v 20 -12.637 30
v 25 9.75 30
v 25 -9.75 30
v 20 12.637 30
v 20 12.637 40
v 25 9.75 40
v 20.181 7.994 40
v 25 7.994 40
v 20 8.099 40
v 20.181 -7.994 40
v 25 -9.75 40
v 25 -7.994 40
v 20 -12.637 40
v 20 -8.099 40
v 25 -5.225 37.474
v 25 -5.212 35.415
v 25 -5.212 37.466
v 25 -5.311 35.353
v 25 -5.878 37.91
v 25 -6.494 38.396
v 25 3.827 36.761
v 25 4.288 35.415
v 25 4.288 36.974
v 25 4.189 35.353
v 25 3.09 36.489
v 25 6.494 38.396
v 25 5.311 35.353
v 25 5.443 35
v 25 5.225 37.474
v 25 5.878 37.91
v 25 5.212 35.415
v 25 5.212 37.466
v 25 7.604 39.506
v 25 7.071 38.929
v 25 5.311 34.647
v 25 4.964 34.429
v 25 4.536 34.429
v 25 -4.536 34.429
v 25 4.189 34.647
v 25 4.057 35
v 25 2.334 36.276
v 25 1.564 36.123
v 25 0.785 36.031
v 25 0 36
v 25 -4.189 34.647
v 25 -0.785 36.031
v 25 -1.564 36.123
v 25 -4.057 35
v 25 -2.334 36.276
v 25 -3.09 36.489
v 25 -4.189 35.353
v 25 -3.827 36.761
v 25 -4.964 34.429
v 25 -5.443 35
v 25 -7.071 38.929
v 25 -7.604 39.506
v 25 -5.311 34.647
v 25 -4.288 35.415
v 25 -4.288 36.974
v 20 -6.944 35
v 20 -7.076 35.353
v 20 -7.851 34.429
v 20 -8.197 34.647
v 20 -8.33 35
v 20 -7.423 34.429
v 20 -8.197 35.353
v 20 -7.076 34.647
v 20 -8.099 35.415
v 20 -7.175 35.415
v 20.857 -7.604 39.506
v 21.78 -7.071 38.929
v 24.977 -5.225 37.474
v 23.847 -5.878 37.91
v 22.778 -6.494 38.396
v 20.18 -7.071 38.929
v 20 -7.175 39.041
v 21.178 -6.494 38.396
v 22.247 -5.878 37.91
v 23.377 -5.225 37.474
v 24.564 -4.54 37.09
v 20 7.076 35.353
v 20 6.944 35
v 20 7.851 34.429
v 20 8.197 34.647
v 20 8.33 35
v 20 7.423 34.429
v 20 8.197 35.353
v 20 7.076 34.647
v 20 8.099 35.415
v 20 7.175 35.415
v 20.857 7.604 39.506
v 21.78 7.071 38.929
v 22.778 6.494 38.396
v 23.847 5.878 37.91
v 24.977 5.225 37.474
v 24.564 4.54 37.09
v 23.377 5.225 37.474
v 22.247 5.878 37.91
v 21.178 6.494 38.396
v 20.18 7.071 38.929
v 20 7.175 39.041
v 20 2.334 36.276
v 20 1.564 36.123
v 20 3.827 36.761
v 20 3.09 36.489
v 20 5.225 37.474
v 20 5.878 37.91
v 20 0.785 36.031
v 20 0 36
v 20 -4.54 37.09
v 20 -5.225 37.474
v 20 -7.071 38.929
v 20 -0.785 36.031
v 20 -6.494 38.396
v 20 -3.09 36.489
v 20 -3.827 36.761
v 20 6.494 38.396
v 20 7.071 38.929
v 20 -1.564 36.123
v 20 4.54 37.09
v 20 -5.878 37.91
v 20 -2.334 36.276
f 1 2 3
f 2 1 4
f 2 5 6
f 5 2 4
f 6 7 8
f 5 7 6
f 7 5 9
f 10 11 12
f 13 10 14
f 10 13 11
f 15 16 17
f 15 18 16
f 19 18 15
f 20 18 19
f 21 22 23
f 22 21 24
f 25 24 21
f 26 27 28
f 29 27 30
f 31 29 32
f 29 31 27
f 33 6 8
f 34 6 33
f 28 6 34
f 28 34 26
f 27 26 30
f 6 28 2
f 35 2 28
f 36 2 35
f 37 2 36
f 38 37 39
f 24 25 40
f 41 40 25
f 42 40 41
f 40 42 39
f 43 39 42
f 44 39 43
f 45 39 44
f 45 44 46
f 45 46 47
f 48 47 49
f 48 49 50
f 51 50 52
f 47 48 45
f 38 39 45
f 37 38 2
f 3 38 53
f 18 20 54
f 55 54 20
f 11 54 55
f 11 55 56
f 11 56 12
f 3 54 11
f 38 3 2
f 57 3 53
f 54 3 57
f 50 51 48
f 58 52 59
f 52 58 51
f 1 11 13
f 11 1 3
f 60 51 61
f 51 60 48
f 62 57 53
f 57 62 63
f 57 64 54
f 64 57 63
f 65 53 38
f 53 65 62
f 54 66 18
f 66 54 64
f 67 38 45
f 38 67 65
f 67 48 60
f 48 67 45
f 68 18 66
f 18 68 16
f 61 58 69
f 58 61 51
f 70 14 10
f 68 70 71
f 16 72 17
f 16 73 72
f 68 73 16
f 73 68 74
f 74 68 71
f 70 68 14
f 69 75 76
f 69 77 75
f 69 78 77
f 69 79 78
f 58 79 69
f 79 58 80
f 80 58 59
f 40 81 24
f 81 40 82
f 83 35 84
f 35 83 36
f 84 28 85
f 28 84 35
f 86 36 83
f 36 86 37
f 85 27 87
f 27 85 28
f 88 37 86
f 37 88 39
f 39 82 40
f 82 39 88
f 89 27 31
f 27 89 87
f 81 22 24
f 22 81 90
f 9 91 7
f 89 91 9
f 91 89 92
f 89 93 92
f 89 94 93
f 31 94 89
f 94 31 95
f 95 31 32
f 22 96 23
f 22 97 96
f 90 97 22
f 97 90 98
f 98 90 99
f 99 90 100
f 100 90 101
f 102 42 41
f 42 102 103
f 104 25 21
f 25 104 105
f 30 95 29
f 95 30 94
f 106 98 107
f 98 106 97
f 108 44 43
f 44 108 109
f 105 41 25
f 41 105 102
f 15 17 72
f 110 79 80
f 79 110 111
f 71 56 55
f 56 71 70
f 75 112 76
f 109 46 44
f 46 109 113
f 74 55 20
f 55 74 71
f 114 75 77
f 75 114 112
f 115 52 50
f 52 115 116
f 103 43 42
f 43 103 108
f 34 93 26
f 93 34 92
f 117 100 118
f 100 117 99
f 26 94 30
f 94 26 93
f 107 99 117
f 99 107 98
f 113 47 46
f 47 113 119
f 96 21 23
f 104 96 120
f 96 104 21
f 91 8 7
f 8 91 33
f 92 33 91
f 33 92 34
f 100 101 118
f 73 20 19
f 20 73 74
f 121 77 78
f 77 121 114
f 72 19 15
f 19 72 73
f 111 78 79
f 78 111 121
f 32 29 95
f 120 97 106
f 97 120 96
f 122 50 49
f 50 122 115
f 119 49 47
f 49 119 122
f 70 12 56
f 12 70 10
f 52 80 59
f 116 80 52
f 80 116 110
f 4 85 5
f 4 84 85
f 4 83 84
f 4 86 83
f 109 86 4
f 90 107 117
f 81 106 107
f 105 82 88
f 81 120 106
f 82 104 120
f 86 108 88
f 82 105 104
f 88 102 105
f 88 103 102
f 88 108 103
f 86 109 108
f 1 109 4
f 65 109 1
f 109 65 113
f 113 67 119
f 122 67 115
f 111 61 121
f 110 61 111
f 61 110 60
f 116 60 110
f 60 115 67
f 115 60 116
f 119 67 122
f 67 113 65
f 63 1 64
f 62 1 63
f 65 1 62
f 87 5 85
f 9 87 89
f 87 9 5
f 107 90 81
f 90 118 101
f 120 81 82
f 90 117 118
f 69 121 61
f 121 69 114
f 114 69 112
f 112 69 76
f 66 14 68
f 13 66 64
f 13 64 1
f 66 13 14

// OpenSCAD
module slidingSlot(){
	difference(){
		rotate_extrude(){
			translate([40,0,0])
			polygon(points=[[0,0],[16,0],[16,10],[11,10],[11,7],[13,4],[13,3],[3,3],[3,4],[5,7],[5,10],[0,10]]);
		}
		translate([0,0,-5])
		linear_extrude(height=20)
		polygon(points=[[60,60],[-60,60],[0,0],[-60,-60],[60,-60]]);
	}
}

module needleSlot(xx,yy,zz){
	l=55;
	translate([xx-(l-5)*cos(30)+25,yy-sin(30)*l-2.25,zz+5])
	rotate([-90,0,-60]){
		cylinder(d=1.2,h=l,$fn=10);
		translate([-0.4,-10,0])
		cube([0.8,10,l]);
	}
}



module waterNeedleHolder(xx,yy,zz){
	narrowY=2.25+sin(30)*5+5;
	wideY=narrowY+tan(30)*25;
	
	difference(){
		union(){

			//Top Scaffold Adaptor
			translate([10,0,zz]){
				cylinder(d=4.9,h=50,$fn=20);
				cylinder(d1=13,d2=5,h=35,$fn=30);
			}
		
			//Base
			translate([xx,yy,zz])
			linear_extrude(height=10)
			polygon(points=[[25,narrowY],[25,-narrowY],[0,-wideY],[0,wideY]]);

			//Odor Tube
			translate([xx,yy,zz+10])
			rotate([0,90,0])	
			cylinder(h=19,d=6,$fn=20);

		}
		
		//Bottom Groove
		translate([xx,yy,zz-5])
		linear_extrude(height=10)
		polygon(points=[[15,tan(30)*10+narrowY-10],[15,-tan(30)*10-narrowY+10],[0,-wideY+10],[0,wideY-10]]);

		//Nose Groove
		translate([xx+18,yy,zz+16])
		rotate([0,90,0])
		cylinder(h=20,d=20,$fn=80);
		
		
		//Odor Tube
		translate([xx-15,yy,zz+10])
		rotate([0,90,0])
		cylinder(h=60,d=4,$fn=20);

		needleSlot(xx,yy,zz);
		mirror([0,1,0]) needleSlot(xx,yy,zz);

	}
	
	//Odor Tube Fixer
	translate([2,0,zz+6]){
		cylinder(d1=4,d2=0.5,h=2.4,$fn=20);
	}
}

// module measureCube(){
	// translate([29,-2.25,0])
	// cube([20,4.5,4.5]);
// }


// module functionColumn(){
	
// }

module mousePlatform(){
	translate([0,-100,0])
	color("grey",1.0){
		cube([200,200,10]);
		translate([60,50,0])
		cube([20,100,20]);
	}
	translate([50,0,37.5])
	rotate([0,90,0])
	{
		difference(){	
			difference(){
				color("white",0.7){
					cylinder(d=45,h=150);
				}
				translate([0,0,-10])
				cylinder(d=35,h=170);
			}
			translate([-30,-50,-10])
			cube([20,100,170]);
		}
	}
}


// mousePlatform();
// translate([70,0,20])
// slidingSlot();
if (false) difference(){
	waterNeedleHolder(0,0,30);
	translate([20,-50,0])cube([100,100,100]);
}else difference(){
	waterNeedleHolder(0,0,30);
	translate([-80,-50,0])cube([100,100,100]);
}
//measureCube();
